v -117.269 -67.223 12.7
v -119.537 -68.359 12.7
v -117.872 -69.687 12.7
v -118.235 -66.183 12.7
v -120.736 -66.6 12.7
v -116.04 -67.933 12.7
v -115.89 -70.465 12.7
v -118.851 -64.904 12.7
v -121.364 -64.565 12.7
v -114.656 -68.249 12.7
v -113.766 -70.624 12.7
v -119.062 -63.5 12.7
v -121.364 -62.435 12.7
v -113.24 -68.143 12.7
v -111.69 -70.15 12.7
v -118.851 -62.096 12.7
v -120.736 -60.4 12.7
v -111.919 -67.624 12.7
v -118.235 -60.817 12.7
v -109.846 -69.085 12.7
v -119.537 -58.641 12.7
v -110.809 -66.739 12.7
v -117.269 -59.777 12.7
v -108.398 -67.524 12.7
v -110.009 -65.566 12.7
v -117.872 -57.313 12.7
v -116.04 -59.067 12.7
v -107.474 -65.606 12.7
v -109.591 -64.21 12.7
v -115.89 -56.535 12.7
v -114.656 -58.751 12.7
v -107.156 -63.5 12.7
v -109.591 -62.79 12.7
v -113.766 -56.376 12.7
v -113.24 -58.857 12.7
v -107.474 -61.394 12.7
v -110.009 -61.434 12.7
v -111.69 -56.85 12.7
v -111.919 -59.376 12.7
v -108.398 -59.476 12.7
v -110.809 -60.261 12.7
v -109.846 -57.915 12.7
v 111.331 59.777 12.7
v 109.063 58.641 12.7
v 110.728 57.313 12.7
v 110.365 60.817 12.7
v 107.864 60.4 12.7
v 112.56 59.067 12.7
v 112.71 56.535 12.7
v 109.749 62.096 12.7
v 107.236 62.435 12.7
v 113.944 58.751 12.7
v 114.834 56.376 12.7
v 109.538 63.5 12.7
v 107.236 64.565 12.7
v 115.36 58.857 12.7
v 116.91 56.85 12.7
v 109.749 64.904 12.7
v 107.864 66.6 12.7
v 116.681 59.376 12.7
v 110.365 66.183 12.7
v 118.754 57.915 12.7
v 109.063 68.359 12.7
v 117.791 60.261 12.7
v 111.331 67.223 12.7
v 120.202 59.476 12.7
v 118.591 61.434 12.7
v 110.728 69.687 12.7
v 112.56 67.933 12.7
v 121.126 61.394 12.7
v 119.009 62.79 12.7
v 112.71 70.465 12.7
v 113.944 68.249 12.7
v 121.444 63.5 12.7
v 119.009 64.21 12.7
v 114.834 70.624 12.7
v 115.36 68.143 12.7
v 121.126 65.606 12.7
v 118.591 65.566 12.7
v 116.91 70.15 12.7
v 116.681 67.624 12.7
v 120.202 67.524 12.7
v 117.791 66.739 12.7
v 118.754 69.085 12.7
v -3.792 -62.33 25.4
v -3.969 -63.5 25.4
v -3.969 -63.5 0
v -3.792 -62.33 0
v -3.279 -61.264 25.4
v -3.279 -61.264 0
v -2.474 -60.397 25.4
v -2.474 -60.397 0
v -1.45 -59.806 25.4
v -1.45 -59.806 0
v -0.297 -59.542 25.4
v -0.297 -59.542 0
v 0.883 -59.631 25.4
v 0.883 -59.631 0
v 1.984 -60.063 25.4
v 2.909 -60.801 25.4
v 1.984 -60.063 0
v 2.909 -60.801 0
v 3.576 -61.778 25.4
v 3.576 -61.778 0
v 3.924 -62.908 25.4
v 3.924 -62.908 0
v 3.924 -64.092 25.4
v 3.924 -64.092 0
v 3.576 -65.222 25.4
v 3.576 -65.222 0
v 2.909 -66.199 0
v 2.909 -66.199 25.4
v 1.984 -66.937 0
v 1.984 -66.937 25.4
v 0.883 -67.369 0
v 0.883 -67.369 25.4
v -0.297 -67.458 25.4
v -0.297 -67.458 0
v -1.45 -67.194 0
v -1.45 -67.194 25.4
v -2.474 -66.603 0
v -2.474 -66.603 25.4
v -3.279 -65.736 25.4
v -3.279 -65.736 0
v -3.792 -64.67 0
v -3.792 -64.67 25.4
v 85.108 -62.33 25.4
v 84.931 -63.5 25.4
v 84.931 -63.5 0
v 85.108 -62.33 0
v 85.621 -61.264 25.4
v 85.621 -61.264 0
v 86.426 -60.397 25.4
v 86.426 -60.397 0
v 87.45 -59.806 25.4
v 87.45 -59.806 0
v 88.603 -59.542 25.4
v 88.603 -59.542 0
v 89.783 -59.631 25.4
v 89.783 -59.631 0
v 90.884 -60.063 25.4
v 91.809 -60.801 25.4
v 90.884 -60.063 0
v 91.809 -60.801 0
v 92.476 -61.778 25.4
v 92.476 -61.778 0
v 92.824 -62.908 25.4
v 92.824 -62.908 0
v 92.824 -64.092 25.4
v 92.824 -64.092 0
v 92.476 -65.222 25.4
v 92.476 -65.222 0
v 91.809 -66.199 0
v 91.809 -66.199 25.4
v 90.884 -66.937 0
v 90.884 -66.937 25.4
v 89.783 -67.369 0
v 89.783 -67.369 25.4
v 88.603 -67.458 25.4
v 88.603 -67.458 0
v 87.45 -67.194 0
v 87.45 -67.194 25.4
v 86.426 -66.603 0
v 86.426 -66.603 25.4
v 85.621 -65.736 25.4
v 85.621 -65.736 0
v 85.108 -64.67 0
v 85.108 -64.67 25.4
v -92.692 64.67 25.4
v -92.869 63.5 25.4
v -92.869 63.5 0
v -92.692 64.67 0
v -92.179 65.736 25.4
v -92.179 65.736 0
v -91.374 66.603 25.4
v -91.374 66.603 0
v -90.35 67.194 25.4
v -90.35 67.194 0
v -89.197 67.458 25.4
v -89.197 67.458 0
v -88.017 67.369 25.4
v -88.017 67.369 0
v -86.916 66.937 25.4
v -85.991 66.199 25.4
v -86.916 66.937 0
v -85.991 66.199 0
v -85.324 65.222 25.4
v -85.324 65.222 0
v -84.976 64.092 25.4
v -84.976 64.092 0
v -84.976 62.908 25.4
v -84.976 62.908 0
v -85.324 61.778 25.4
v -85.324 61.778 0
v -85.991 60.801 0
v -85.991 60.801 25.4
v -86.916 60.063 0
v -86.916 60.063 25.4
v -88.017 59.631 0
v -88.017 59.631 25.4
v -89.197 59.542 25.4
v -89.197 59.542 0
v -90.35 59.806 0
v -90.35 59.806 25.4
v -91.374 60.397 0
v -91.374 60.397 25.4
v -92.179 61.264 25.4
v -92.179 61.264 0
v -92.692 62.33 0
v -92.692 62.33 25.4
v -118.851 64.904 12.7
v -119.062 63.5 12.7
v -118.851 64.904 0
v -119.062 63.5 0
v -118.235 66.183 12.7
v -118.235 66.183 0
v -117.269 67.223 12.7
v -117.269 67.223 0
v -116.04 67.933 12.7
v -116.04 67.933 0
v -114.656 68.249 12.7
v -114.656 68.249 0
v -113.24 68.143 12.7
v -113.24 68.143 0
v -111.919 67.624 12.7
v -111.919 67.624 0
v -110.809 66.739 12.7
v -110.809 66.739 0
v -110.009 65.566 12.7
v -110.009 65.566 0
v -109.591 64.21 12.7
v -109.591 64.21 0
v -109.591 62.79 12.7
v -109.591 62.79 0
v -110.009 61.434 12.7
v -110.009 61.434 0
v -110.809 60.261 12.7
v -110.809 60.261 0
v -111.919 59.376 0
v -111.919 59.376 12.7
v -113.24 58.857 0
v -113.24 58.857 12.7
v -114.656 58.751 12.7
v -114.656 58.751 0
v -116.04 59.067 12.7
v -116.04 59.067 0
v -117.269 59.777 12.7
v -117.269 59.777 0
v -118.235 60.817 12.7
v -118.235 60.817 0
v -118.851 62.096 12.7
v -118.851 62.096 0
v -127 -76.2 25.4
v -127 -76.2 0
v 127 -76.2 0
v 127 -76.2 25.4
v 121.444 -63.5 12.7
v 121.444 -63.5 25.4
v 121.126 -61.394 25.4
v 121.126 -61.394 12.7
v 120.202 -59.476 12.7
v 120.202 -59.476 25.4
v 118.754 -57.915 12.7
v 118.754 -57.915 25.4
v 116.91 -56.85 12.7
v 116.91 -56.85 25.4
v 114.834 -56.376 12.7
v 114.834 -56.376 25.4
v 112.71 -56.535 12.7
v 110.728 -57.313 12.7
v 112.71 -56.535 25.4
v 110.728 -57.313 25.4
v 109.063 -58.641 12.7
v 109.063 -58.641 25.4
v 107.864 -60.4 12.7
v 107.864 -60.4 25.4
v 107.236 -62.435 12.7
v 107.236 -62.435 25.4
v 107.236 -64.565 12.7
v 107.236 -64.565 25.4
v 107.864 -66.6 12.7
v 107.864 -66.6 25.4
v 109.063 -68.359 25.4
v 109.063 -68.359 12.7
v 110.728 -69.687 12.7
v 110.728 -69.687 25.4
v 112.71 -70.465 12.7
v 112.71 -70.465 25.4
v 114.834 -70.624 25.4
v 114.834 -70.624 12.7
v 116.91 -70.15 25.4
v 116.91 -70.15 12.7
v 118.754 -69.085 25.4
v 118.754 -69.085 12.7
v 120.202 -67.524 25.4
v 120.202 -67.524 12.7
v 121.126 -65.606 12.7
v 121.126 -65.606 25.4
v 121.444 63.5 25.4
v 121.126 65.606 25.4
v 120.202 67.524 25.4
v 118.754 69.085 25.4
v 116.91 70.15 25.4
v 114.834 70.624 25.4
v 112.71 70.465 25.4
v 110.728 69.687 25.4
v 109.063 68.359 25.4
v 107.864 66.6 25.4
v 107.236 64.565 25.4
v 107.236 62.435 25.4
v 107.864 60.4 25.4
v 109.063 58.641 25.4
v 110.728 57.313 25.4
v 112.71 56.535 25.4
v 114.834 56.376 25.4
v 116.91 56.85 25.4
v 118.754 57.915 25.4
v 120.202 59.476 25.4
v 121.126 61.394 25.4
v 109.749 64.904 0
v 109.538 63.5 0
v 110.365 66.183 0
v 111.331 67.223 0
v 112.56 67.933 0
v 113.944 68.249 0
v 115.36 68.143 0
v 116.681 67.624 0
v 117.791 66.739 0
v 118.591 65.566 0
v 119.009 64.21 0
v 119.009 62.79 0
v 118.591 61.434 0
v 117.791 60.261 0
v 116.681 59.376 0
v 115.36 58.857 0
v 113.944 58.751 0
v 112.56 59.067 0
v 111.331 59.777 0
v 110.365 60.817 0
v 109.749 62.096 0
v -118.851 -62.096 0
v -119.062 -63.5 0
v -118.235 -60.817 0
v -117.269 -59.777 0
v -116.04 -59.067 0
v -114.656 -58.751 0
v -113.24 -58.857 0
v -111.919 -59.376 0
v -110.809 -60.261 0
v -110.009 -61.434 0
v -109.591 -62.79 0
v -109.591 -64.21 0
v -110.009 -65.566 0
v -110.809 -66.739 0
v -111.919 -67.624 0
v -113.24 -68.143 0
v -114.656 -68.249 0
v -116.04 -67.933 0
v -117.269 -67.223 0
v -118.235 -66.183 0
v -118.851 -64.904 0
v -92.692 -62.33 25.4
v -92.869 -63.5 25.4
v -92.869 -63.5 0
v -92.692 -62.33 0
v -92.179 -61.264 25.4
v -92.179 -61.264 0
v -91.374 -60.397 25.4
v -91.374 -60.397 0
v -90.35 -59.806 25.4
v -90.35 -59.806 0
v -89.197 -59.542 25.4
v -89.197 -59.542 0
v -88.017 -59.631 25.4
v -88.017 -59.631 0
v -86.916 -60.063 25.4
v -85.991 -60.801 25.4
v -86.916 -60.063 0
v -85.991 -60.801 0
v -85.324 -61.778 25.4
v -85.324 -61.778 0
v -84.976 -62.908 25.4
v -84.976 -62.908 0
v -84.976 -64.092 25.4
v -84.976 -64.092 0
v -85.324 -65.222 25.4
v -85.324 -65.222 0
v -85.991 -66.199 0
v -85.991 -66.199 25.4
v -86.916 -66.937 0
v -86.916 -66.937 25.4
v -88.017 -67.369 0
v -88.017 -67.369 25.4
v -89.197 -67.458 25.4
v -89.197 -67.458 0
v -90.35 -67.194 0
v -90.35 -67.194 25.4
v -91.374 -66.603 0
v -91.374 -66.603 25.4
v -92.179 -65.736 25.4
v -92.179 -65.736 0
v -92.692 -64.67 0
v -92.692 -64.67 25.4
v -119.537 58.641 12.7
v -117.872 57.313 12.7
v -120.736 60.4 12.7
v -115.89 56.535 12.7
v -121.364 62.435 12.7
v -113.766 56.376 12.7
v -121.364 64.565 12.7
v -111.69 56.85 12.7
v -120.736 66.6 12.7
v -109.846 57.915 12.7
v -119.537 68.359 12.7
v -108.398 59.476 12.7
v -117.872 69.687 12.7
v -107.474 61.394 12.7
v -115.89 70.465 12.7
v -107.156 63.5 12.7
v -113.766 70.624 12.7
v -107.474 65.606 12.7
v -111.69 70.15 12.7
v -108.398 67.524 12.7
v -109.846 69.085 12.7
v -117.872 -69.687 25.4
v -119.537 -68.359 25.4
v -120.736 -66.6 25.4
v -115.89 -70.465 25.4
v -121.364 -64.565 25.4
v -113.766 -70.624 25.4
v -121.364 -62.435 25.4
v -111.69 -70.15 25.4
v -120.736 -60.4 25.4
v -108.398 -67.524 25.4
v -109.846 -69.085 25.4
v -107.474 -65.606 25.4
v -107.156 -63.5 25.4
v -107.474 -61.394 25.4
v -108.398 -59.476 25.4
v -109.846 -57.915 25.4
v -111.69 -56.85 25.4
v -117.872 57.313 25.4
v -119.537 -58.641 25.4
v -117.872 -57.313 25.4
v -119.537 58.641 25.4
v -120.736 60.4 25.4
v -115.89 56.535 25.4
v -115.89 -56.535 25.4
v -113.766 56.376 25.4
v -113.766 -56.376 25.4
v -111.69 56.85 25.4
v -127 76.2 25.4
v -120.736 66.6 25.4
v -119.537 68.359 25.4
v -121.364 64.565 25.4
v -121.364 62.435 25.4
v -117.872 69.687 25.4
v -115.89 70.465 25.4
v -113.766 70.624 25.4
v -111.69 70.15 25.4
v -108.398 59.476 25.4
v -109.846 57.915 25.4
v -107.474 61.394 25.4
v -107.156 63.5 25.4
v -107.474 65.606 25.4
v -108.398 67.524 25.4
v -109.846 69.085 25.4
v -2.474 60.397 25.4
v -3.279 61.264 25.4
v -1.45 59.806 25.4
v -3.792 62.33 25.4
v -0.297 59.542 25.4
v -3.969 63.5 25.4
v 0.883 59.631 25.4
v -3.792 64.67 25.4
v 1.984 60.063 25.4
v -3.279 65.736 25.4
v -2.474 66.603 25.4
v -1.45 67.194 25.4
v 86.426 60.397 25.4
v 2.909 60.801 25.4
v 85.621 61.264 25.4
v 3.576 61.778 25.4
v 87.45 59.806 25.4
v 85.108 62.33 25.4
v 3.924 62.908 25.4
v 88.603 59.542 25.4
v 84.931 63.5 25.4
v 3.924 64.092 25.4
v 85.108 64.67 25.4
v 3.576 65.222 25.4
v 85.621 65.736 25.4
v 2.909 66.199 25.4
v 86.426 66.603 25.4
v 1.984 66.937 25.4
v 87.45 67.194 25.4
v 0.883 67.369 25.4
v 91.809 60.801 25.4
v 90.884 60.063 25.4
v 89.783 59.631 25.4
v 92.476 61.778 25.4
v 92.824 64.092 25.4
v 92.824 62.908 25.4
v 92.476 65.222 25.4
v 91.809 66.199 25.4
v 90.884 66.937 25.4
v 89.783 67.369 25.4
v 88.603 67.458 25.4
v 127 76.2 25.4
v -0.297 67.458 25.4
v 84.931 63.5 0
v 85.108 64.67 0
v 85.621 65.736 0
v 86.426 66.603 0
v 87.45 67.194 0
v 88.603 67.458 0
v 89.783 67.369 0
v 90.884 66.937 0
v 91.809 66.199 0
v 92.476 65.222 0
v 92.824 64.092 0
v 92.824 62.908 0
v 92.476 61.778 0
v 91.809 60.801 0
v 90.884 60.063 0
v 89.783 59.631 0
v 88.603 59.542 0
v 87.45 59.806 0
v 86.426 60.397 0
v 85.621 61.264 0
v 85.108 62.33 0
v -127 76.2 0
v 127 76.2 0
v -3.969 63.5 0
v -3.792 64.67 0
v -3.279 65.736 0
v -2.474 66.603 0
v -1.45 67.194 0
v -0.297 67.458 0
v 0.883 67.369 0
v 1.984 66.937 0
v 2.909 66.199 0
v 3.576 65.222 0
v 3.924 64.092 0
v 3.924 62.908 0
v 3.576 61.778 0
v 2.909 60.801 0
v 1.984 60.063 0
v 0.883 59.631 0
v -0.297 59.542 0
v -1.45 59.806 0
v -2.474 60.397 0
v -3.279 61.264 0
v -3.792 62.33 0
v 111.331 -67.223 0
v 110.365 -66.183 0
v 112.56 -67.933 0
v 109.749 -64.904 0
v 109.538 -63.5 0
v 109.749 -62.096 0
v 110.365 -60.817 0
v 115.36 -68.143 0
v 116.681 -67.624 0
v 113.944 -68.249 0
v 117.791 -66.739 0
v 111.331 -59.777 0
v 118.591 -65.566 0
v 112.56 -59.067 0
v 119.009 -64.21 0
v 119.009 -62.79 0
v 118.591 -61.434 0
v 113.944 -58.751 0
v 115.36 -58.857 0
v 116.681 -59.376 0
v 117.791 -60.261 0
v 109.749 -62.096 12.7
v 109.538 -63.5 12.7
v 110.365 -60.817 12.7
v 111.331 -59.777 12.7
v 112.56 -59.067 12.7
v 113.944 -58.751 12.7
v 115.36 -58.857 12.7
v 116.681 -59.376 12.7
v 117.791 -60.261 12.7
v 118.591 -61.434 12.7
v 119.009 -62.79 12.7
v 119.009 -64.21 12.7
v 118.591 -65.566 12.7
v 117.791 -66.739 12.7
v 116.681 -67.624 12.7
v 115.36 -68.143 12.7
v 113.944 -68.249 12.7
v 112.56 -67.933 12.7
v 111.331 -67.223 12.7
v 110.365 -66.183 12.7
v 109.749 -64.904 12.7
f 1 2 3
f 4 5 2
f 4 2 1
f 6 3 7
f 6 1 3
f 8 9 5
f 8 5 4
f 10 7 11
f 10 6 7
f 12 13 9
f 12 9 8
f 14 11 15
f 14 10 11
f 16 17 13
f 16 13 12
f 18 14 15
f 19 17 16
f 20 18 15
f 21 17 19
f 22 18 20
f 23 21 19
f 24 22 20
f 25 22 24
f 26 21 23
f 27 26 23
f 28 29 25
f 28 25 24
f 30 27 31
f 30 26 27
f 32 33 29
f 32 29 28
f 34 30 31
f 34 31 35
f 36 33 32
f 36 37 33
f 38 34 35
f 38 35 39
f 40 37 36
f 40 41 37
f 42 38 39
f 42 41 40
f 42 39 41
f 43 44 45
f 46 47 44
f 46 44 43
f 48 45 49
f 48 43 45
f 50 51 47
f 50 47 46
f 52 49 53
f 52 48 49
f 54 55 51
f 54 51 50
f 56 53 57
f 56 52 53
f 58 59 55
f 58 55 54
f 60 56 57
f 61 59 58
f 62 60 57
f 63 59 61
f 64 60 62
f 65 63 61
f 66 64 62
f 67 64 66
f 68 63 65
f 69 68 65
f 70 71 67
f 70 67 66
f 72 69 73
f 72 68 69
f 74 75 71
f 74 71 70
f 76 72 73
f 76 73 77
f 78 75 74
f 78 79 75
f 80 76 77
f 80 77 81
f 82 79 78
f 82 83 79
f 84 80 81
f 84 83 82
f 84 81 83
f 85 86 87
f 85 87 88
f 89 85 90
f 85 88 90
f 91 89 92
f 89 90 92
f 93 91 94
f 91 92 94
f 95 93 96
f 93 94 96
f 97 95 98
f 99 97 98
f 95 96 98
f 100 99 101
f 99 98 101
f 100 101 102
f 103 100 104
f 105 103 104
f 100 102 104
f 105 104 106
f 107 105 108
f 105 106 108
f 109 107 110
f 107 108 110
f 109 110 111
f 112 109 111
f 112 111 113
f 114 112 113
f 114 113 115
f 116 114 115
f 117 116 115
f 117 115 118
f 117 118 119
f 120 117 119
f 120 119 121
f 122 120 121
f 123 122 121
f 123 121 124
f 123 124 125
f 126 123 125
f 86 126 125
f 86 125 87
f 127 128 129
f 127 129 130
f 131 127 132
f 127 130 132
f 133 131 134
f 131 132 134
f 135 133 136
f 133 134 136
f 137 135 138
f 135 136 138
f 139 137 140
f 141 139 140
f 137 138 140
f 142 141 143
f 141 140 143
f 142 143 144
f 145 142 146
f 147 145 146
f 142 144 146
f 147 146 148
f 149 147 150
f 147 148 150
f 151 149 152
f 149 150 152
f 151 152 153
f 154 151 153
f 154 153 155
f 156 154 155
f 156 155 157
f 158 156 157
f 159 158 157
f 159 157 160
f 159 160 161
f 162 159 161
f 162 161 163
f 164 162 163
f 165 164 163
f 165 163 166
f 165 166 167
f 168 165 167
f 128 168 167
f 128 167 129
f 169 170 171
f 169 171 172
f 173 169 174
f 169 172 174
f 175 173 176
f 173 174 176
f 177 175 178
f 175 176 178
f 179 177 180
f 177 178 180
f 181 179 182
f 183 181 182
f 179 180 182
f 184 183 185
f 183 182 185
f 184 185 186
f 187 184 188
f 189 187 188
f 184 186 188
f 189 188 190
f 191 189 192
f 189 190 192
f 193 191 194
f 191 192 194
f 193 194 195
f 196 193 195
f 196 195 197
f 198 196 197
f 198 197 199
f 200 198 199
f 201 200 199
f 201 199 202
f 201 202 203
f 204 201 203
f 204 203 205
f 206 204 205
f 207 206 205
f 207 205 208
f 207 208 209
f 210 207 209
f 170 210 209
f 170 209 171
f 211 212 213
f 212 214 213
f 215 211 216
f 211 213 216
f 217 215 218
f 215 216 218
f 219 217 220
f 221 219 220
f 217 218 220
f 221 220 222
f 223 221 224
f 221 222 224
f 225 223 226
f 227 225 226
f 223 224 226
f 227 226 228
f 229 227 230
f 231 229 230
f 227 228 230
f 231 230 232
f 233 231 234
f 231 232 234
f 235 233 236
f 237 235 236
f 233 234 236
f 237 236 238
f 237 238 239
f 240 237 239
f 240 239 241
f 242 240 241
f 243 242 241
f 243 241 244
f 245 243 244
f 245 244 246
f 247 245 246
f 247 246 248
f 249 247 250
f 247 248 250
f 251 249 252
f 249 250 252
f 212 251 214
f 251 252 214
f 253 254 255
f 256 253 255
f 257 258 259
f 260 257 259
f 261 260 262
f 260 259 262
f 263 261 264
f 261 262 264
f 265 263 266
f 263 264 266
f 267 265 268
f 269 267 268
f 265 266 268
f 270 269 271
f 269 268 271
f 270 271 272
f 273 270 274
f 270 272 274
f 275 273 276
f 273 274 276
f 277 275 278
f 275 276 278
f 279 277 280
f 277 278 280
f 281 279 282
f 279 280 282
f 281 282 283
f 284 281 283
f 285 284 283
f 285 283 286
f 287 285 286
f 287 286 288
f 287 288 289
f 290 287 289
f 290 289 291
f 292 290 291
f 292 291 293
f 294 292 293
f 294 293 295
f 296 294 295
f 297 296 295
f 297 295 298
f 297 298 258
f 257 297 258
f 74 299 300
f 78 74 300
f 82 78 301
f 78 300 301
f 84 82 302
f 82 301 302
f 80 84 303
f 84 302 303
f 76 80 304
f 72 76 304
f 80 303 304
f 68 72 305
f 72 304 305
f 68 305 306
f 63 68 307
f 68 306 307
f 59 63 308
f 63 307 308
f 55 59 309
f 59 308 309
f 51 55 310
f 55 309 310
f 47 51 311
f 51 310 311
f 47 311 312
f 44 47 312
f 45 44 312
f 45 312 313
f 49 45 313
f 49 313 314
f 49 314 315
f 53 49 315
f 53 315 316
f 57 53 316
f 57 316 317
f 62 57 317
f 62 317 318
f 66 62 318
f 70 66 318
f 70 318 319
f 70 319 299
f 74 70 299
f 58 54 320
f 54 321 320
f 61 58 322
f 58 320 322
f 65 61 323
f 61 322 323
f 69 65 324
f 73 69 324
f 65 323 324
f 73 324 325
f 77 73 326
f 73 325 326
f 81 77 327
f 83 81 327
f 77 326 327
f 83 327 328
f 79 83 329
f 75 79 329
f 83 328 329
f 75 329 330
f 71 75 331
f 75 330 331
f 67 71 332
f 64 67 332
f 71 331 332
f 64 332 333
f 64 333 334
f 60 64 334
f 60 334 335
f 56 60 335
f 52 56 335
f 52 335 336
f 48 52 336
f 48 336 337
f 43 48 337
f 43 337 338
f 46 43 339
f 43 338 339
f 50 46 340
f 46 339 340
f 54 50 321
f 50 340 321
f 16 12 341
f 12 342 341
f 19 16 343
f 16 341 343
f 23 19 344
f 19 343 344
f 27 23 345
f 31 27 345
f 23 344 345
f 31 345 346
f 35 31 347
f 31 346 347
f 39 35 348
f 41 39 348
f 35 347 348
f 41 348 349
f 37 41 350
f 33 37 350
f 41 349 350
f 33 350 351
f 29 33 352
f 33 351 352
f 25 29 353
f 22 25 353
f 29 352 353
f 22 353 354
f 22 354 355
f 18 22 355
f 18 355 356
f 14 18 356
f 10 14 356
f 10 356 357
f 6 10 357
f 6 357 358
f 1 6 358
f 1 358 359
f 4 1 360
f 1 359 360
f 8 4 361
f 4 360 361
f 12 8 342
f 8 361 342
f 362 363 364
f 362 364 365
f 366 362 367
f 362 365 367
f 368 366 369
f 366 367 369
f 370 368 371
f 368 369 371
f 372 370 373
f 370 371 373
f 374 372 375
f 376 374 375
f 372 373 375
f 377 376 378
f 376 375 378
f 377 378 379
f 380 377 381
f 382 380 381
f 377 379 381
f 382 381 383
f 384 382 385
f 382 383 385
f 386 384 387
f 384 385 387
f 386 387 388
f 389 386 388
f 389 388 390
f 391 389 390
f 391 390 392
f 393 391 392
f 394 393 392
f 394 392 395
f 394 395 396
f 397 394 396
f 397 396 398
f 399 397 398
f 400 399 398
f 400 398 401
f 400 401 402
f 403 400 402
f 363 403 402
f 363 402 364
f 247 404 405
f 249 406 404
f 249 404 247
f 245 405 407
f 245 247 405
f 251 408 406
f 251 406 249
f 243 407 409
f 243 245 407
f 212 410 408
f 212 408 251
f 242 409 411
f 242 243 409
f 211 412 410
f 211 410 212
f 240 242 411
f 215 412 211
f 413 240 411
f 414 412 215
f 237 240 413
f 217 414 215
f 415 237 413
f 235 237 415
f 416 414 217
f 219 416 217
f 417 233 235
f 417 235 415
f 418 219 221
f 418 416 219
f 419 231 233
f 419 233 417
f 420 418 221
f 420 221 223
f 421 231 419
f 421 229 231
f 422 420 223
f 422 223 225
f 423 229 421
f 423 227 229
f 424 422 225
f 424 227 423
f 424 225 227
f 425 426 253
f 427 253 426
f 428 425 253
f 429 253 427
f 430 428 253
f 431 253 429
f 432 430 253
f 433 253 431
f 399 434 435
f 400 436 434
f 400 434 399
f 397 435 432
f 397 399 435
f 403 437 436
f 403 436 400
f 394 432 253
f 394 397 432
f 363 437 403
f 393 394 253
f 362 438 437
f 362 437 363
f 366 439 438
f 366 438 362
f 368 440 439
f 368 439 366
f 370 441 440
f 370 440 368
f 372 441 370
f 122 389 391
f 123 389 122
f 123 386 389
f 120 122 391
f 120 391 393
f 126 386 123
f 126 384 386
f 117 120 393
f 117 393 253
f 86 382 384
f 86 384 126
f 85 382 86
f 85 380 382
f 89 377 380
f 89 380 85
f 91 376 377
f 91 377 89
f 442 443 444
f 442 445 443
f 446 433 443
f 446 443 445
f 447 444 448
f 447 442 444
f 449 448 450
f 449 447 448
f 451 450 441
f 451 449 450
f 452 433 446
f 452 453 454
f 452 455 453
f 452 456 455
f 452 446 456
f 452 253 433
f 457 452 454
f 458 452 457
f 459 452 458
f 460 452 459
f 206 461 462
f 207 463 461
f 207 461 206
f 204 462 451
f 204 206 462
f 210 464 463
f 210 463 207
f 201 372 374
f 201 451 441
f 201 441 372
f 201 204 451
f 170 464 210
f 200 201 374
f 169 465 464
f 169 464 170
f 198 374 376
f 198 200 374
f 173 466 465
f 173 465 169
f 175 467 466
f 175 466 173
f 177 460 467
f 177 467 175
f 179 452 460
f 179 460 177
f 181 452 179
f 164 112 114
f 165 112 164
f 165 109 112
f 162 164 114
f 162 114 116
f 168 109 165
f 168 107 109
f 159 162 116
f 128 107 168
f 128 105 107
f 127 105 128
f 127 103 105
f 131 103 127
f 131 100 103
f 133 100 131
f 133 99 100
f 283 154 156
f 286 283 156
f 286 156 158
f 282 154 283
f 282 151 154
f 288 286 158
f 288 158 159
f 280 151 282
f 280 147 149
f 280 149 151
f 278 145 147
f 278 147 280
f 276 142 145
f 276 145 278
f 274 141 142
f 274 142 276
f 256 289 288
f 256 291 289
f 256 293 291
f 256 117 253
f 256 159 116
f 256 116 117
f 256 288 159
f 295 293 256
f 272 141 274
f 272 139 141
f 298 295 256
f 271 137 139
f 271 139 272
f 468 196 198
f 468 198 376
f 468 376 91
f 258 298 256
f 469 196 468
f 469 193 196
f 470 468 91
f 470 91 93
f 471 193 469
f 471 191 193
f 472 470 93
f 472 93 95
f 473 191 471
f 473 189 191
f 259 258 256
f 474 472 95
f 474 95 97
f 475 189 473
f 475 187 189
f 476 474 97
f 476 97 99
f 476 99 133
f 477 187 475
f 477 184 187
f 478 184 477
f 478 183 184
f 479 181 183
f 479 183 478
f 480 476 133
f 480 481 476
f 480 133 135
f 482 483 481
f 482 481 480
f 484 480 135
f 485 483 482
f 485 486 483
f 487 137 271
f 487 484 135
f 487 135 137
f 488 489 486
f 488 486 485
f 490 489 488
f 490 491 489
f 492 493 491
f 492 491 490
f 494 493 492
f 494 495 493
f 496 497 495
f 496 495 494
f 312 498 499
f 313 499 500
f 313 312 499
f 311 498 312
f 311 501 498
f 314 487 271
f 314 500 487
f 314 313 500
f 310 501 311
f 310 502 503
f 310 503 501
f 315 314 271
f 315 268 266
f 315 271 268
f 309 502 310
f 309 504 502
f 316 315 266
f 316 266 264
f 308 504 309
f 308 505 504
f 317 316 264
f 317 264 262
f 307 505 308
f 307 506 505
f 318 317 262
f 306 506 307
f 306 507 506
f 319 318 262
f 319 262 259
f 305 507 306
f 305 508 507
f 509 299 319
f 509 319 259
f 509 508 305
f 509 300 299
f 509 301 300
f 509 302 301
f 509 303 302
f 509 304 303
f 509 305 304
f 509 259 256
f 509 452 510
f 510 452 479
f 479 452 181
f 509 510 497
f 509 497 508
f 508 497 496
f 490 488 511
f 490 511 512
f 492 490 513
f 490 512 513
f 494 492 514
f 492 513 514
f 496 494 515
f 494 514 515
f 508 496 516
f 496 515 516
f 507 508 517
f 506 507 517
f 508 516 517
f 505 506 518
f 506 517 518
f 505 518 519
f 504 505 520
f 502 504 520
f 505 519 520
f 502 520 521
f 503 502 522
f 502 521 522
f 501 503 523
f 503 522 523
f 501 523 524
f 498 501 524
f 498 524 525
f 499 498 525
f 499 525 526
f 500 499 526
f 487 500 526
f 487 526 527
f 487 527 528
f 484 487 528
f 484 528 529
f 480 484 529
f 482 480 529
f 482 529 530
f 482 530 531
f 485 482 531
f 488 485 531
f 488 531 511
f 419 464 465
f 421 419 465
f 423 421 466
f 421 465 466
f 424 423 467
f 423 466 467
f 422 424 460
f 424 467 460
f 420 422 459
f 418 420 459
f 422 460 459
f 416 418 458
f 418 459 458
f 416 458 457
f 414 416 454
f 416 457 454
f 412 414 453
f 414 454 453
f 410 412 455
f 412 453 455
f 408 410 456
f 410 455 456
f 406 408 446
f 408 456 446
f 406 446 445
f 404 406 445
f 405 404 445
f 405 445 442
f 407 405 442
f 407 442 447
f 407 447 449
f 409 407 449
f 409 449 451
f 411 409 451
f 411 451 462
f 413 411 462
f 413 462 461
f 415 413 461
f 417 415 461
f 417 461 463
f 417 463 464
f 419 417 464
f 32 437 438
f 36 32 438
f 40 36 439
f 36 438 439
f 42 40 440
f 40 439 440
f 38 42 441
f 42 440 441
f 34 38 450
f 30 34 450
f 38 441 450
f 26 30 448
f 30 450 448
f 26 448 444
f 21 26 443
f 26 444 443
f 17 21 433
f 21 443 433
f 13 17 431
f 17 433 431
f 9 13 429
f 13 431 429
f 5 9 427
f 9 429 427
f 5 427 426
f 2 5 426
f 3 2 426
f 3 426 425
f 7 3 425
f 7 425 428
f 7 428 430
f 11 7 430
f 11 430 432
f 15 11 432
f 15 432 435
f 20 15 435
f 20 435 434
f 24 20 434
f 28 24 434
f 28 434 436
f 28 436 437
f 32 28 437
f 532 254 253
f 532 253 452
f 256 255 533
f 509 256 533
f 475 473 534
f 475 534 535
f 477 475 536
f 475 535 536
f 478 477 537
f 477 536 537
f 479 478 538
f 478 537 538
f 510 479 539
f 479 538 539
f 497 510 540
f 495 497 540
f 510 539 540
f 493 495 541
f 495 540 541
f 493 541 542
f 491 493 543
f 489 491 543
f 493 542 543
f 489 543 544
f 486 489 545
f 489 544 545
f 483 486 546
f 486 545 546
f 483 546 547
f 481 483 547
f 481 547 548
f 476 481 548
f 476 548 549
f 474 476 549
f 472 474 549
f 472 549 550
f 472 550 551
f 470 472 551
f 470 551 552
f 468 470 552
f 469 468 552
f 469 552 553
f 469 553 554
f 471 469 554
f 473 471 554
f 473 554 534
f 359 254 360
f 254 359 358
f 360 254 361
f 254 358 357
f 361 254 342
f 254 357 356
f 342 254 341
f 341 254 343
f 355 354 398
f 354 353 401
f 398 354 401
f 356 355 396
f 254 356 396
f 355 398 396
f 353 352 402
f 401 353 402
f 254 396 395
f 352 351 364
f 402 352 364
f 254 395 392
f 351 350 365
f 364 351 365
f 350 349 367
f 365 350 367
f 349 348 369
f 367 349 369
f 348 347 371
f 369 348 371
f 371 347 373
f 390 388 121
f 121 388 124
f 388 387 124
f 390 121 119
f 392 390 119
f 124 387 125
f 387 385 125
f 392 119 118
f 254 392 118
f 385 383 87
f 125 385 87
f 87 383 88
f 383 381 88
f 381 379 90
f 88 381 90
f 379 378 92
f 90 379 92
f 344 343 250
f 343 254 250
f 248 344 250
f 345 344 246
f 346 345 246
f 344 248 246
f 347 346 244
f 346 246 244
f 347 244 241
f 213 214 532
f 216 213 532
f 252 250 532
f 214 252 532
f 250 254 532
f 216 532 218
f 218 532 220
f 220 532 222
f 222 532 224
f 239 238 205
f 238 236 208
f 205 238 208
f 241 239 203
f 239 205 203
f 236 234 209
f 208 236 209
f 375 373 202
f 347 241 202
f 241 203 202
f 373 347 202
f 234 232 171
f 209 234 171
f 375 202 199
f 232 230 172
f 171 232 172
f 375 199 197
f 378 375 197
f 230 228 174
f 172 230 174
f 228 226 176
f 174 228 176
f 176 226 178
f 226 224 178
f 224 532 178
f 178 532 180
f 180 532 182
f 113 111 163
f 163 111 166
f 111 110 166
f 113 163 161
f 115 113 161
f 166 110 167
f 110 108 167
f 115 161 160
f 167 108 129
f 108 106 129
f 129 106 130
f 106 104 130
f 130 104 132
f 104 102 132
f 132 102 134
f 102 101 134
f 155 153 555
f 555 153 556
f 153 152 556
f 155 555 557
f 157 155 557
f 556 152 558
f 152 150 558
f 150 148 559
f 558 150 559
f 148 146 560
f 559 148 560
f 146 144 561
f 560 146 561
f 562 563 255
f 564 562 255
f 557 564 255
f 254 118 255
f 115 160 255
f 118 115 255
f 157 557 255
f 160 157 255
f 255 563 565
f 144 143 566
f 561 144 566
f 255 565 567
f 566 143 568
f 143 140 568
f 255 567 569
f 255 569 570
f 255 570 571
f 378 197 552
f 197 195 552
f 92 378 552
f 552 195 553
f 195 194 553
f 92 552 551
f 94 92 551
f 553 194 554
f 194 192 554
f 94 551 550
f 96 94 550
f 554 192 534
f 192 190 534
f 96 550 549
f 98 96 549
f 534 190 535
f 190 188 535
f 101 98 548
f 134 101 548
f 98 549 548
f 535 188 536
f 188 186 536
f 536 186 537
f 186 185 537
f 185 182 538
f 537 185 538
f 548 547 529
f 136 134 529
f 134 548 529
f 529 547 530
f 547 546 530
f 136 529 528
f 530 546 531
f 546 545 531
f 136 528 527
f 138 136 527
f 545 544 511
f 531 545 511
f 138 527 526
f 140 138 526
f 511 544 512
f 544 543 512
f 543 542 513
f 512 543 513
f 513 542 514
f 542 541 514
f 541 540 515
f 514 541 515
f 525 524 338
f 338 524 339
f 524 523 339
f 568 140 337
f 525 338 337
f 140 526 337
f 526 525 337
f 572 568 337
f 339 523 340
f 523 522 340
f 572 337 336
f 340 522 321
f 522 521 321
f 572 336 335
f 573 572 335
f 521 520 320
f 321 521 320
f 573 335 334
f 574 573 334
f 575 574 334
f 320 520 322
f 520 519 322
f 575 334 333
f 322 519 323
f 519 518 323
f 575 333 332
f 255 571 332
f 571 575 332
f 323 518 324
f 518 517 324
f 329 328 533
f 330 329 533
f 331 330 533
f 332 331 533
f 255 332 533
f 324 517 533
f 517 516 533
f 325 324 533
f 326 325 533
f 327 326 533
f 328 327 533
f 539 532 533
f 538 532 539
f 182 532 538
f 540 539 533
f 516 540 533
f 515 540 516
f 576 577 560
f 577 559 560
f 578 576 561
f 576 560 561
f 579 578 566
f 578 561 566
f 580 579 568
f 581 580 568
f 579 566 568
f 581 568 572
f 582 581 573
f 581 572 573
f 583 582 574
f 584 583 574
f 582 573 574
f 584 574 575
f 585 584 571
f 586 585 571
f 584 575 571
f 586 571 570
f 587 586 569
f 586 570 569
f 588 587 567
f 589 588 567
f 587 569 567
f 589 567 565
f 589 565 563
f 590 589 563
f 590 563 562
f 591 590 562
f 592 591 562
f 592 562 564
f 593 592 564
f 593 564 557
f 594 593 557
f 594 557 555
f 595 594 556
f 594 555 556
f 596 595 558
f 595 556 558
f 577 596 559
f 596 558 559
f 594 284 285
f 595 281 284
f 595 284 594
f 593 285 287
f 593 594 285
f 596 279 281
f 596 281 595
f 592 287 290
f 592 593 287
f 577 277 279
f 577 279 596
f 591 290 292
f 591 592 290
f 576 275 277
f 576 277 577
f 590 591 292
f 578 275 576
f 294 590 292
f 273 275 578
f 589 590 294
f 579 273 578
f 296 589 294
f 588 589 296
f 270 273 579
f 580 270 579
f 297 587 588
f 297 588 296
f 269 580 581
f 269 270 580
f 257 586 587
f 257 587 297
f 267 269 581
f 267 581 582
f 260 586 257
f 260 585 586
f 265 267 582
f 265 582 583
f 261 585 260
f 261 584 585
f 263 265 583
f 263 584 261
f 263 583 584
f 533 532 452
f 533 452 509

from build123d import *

# Parameters (mm, degrees)
F0_W           = 254
F0_H           = 152.4
F1_DEPTH       = 25.4
F3_D           = 9.525
F3_CBORE_D     = 14.2875
F3_CBORE_DEPTH = 12.7
F5_D           = 7.9375


# Not quite as in the source:
# - a length typed as a fraction of an inch, garbled in the dataset ("3 / 203.2 mm" for 3/8 in), is restored


with BuildPart() as f1:
    # F0 (on Top) → F1 (new body)
    with BuildSketch(Plane.XY):
        Rectangle(F0_W, F0_H)
    extrude(amount=F1_DEPTH)

    # F3 (through all)
    with Locations(Plane.XY.offset(25.4)):
        with Locations((-114.3, 63.5), (-114.3, -63.5), (114.3, 63.5), (114.3, -63.5)):
            CounterBoreHole(F3_D / 2, F3_CBORE_D / 2, F3_CBORE_DEPTH)

    # F5 (through all)
    with Locations(Plane.XY.offset(25.4)):
        with Locations((-88.9, 63.5), (0, 63.5), (88.9, 63.5), (88.9, -63.5), (0, -63.5), (-88.9, -63.5)):
            Hole(F5_D / 2)


solid = f1.part
